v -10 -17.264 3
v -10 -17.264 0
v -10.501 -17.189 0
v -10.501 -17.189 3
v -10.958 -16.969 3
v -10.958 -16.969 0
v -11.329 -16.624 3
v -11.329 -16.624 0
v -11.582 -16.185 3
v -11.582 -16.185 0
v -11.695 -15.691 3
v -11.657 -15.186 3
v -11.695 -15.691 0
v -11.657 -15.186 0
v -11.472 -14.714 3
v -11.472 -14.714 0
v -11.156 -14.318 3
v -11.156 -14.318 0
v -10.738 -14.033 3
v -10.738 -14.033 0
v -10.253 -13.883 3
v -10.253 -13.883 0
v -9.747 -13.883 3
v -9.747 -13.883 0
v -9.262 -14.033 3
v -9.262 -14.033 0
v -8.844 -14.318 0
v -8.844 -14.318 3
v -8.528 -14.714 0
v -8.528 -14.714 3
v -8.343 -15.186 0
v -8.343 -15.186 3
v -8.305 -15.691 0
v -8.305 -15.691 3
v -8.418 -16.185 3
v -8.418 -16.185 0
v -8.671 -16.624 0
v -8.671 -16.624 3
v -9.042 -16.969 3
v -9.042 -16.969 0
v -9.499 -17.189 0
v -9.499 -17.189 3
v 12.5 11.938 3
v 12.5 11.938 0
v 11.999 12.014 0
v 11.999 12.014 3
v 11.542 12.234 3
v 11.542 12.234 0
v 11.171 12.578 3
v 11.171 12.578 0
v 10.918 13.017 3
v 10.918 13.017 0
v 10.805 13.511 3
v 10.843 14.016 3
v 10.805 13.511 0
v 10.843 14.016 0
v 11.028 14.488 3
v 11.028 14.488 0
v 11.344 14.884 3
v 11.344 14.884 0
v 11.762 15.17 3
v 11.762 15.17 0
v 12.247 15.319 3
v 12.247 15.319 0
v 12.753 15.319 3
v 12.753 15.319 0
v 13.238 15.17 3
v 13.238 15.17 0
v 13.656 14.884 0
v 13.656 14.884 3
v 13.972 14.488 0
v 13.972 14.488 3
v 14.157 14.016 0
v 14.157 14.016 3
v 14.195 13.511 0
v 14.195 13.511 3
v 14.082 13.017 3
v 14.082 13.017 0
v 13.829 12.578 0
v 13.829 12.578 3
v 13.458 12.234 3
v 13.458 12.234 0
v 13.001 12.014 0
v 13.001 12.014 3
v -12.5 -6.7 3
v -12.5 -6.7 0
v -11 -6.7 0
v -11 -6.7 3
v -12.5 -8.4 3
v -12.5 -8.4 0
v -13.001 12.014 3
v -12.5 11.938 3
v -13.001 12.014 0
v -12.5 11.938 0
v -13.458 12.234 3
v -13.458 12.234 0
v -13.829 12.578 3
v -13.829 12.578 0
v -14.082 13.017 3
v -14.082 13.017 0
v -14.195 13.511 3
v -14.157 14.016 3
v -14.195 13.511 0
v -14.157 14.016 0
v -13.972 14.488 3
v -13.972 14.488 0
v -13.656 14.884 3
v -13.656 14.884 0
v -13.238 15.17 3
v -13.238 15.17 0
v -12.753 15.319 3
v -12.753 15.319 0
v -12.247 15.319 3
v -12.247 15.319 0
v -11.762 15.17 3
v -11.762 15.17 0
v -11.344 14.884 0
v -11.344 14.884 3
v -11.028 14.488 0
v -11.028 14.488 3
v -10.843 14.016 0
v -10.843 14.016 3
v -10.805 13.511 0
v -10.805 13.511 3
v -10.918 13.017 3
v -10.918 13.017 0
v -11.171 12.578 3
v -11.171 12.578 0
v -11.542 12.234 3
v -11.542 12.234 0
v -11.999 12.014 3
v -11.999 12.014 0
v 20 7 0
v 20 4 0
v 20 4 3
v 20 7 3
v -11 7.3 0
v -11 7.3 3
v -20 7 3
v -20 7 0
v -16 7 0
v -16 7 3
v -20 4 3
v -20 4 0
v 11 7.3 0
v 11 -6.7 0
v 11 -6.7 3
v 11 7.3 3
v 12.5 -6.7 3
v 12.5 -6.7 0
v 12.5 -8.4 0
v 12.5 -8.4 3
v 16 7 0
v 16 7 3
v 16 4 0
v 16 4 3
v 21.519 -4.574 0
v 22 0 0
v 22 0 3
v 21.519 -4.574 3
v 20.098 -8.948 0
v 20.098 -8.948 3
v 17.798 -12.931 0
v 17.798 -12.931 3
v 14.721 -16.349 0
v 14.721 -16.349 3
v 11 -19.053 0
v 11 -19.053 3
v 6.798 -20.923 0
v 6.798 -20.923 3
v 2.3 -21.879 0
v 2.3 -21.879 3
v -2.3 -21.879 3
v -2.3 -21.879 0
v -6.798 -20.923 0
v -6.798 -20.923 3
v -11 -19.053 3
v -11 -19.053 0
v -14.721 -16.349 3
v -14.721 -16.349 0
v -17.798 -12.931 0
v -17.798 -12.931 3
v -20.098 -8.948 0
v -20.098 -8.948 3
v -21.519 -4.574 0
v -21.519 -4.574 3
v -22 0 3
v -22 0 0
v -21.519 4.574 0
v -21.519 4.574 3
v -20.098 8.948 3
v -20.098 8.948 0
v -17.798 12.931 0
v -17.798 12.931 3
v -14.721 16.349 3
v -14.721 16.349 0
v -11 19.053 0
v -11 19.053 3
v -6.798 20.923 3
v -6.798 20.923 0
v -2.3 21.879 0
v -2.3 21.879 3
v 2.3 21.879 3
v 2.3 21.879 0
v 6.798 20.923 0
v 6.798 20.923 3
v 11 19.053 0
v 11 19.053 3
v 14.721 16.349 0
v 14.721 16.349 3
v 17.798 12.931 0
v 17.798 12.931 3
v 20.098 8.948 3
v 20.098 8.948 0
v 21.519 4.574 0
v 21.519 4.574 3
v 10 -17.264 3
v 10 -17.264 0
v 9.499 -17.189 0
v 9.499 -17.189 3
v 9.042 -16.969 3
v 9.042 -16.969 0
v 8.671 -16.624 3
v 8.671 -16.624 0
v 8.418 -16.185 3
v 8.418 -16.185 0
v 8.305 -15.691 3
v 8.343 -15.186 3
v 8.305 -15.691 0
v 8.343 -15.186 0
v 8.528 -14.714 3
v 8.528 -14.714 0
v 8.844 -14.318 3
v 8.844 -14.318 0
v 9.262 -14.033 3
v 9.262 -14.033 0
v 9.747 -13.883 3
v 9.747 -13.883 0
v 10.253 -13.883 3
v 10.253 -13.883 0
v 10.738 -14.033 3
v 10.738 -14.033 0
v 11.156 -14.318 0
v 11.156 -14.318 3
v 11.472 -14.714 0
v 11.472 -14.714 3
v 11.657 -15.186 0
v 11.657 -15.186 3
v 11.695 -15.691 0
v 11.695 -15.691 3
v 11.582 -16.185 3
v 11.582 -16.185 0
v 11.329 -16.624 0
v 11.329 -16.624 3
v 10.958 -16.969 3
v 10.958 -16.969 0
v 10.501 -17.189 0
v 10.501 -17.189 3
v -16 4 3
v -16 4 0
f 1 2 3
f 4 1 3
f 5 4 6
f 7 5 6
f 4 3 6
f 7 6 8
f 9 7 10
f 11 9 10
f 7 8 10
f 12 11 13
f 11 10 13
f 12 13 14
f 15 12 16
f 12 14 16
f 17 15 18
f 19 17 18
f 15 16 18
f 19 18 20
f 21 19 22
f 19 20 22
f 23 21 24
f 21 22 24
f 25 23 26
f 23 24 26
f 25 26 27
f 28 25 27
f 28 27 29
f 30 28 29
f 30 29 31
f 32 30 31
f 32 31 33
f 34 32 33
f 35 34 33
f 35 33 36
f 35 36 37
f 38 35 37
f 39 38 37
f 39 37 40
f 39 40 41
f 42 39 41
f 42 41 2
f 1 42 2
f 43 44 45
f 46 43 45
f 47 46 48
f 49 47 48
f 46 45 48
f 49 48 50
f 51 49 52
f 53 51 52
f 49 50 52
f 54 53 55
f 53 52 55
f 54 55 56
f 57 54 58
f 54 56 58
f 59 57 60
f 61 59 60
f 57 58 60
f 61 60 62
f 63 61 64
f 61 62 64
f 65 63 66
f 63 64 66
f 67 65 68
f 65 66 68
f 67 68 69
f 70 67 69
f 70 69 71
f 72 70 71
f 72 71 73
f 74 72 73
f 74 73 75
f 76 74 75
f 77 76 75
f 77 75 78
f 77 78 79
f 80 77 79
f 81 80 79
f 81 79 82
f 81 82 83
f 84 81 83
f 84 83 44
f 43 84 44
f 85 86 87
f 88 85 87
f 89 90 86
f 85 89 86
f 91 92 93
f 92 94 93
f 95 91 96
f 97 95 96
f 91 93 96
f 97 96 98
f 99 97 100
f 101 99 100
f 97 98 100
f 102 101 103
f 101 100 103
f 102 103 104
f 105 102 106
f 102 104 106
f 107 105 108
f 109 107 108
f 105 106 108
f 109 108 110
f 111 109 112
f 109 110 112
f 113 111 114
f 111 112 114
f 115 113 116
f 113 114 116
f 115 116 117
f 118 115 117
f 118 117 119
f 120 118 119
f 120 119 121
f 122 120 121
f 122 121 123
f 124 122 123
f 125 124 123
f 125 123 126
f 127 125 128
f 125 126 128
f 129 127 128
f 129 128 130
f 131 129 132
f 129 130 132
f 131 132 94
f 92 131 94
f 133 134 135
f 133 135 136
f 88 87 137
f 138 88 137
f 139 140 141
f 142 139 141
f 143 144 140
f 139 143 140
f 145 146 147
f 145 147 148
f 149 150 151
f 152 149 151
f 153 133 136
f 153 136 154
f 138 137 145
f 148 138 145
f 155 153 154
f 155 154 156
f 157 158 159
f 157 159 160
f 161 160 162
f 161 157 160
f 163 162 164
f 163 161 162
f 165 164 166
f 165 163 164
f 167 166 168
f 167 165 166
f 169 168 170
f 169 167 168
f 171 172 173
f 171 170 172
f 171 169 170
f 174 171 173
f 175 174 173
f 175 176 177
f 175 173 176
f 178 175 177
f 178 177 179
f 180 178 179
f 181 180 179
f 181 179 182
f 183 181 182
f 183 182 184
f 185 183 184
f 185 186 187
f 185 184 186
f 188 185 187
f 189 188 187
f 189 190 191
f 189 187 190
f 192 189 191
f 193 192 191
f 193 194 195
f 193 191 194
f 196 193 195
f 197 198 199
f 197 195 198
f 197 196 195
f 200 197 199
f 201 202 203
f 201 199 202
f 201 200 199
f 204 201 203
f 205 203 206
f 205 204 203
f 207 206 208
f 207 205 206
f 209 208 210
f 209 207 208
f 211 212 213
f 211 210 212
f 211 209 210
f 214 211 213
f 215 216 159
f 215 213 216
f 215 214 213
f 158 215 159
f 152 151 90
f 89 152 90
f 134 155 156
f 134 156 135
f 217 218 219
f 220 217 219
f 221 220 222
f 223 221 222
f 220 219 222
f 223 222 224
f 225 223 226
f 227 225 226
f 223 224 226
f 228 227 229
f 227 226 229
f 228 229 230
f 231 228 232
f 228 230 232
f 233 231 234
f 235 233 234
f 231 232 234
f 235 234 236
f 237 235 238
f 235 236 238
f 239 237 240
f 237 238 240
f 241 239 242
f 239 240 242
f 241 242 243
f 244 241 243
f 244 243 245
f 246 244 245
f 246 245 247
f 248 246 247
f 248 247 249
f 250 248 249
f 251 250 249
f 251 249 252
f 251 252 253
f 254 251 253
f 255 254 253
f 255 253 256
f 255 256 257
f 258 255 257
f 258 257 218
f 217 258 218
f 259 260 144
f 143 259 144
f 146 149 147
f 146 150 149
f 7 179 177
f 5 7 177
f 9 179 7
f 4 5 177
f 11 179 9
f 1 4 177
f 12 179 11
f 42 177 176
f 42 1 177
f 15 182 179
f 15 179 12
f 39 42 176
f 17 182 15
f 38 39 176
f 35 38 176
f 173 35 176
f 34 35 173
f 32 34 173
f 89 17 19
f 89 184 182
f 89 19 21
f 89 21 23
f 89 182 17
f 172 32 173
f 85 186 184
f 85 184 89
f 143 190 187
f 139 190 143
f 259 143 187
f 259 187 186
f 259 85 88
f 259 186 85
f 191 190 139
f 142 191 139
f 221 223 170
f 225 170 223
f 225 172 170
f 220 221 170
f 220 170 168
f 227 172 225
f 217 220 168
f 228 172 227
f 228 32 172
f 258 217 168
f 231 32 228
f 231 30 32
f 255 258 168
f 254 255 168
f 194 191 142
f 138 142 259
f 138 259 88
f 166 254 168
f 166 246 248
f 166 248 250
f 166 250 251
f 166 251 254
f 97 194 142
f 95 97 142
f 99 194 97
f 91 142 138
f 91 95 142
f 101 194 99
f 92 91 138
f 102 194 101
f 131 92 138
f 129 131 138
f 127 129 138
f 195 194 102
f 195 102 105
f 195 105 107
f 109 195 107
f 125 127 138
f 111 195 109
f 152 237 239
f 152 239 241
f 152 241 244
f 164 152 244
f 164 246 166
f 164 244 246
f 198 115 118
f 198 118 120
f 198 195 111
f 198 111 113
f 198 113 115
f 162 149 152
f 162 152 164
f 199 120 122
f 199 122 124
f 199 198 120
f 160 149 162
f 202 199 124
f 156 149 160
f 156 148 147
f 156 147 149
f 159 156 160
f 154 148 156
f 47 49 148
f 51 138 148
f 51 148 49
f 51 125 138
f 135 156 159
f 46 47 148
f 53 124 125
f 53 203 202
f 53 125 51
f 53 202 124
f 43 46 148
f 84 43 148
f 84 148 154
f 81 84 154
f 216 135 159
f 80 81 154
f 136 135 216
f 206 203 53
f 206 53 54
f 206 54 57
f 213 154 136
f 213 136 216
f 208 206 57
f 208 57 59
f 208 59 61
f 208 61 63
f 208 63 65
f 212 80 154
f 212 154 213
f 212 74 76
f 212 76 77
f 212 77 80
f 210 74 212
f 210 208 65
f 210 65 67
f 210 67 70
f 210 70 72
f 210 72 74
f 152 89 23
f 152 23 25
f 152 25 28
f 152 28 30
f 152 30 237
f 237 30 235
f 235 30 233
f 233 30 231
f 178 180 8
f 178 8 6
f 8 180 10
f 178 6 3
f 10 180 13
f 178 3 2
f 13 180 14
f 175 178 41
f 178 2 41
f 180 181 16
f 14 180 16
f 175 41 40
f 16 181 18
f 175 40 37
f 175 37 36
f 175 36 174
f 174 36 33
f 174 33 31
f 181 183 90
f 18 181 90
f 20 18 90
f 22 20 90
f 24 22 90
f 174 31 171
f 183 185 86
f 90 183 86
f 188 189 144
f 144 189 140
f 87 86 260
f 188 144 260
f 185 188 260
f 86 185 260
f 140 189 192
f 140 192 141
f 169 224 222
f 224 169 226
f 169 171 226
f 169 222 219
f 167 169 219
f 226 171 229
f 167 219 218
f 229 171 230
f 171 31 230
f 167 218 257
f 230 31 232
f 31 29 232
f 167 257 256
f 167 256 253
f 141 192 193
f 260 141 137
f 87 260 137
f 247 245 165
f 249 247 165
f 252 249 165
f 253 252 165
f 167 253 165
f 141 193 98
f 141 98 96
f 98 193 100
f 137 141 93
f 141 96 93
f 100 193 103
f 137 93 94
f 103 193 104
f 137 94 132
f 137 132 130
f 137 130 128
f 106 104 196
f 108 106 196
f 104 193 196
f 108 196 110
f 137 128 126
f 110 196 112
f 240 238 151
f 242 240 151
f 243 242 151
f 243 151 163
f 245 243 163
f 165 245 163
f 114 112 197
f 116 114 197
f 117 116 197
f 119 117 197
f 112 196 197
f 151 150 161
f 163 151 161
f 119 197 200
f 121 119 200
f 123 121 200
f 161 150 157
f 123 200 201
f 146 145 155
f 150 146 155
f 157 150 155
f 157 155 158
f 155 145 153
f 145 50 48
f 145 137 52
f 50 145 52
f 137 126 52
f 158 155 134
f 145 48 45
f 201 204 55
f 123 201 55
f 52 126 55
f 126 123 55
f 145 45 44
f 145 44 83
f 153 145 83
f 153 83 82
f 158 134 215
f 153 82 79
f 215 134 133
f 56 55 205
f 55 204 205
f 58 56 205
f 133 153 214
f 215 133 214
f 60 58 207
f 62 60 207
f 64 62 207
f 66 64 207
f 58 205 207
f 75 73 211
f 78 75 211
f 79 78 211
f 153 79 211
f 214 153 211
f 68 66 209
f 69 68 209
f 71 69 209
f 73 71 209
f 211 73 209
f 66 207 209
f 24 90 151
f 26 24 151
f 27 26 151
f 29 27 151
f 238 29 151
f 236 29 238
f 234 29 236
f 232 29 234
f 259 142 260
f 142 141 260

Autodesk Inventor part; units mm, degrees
ref_plane "Plan YZ" through (0, 0, 0) normal (1, 0, 0) x (0, 1, 0)
ref_plane "Plan XZ" through (0, 0, 0) normal (0, 1, 0) x (-1, 0, 0)
ref_plane "Plan XY" through (0, 0, 0) normal (0, 0, 1) x (1, 0, 0)
sketch "Esquisse1" plane through (0, 0, 0) normal (0, 0, 1) x (1, 0, 0)
  circle A0 centre (0, 0) radius 22
  line L0 (12.5, -6.7) -> (12.5, -8.4)
  line L1 (12.5, -8.4) -> (-12.5, -8.4)
  line L2 (-12.5, -8.4) -> (-12.5, -6.7)
  line L3 (-11, -6.7) -> (-11, 7.3)
  line L4 (11, -6.7) -> (11, 7.3)
  line L5 (-12.5, -6.7) -> (-11, -6.7)
  line L6 (12.5, -6.7) -> (11, -6.7)
  line L7 (-11, 7.3) -> (11, 7.3)
  line L8 (-20, 7) -> (-16, 7)
  line L9 (-16, 7) -> (-16, 4)
  line L10 (-16, 4) -> (-20, 4)
  line L11 (-20, 4) -> (-20, 7)
  line L12 (20, 7) -> (16, 7)
  line L13 (16, 7) -> (16, 4)
  line L14 (16, 4) -> (20, 4)
  line L15 (20, 4) -> (20, 7)
  line L16 (-30.8, 0) -> (30.8, 0) construction
  line L17 (0, -30.8) -> (0, 30.8) construction
  dimension "d0" = 44
  dimension "d17" = 1.5
  dimension "d23" = 3
  dimension "d24" = 4
  dimension "d25" = 32
  dimension "d38" = 4
  dimension "d43" = 1.7
  dimension "d44" = 14
  dimension "d47" = 25
  dimension "d57" = 6.7
extrude "Extrusion4" add sketch "Esquisse1" along normal blind 3
sketch "Esquisse7" plane through (0, 0, 3) normal (0, 0, 1) x (1, 0, 0)
  circle A0 centre (0, 0) radius 18.5 construction
  point P0 (-12.5, 13.6382)
  point P1 (12.5, 13.6382)
  point P2 (-10, -15.5644)
  point P3 (10, -15.5644)
  dimension "d58" = 37
  dimension "d59" = 25
  dimension "d60" = 20
hole "Perçage2" at (-12.5, 13.6382, 3) at (12.5, 13.6382, 3) at (-10, -15.5644, 3) at (10, -15.5644, 3) direction (0, 0, -1) diameter 3.4 end through all clearance for "Vis d'assemblage à six pans creux ISO 4762" size "M3" standard "ISO"
properties part number "S1702_couverclereplat" material "Plastique PMMA"
